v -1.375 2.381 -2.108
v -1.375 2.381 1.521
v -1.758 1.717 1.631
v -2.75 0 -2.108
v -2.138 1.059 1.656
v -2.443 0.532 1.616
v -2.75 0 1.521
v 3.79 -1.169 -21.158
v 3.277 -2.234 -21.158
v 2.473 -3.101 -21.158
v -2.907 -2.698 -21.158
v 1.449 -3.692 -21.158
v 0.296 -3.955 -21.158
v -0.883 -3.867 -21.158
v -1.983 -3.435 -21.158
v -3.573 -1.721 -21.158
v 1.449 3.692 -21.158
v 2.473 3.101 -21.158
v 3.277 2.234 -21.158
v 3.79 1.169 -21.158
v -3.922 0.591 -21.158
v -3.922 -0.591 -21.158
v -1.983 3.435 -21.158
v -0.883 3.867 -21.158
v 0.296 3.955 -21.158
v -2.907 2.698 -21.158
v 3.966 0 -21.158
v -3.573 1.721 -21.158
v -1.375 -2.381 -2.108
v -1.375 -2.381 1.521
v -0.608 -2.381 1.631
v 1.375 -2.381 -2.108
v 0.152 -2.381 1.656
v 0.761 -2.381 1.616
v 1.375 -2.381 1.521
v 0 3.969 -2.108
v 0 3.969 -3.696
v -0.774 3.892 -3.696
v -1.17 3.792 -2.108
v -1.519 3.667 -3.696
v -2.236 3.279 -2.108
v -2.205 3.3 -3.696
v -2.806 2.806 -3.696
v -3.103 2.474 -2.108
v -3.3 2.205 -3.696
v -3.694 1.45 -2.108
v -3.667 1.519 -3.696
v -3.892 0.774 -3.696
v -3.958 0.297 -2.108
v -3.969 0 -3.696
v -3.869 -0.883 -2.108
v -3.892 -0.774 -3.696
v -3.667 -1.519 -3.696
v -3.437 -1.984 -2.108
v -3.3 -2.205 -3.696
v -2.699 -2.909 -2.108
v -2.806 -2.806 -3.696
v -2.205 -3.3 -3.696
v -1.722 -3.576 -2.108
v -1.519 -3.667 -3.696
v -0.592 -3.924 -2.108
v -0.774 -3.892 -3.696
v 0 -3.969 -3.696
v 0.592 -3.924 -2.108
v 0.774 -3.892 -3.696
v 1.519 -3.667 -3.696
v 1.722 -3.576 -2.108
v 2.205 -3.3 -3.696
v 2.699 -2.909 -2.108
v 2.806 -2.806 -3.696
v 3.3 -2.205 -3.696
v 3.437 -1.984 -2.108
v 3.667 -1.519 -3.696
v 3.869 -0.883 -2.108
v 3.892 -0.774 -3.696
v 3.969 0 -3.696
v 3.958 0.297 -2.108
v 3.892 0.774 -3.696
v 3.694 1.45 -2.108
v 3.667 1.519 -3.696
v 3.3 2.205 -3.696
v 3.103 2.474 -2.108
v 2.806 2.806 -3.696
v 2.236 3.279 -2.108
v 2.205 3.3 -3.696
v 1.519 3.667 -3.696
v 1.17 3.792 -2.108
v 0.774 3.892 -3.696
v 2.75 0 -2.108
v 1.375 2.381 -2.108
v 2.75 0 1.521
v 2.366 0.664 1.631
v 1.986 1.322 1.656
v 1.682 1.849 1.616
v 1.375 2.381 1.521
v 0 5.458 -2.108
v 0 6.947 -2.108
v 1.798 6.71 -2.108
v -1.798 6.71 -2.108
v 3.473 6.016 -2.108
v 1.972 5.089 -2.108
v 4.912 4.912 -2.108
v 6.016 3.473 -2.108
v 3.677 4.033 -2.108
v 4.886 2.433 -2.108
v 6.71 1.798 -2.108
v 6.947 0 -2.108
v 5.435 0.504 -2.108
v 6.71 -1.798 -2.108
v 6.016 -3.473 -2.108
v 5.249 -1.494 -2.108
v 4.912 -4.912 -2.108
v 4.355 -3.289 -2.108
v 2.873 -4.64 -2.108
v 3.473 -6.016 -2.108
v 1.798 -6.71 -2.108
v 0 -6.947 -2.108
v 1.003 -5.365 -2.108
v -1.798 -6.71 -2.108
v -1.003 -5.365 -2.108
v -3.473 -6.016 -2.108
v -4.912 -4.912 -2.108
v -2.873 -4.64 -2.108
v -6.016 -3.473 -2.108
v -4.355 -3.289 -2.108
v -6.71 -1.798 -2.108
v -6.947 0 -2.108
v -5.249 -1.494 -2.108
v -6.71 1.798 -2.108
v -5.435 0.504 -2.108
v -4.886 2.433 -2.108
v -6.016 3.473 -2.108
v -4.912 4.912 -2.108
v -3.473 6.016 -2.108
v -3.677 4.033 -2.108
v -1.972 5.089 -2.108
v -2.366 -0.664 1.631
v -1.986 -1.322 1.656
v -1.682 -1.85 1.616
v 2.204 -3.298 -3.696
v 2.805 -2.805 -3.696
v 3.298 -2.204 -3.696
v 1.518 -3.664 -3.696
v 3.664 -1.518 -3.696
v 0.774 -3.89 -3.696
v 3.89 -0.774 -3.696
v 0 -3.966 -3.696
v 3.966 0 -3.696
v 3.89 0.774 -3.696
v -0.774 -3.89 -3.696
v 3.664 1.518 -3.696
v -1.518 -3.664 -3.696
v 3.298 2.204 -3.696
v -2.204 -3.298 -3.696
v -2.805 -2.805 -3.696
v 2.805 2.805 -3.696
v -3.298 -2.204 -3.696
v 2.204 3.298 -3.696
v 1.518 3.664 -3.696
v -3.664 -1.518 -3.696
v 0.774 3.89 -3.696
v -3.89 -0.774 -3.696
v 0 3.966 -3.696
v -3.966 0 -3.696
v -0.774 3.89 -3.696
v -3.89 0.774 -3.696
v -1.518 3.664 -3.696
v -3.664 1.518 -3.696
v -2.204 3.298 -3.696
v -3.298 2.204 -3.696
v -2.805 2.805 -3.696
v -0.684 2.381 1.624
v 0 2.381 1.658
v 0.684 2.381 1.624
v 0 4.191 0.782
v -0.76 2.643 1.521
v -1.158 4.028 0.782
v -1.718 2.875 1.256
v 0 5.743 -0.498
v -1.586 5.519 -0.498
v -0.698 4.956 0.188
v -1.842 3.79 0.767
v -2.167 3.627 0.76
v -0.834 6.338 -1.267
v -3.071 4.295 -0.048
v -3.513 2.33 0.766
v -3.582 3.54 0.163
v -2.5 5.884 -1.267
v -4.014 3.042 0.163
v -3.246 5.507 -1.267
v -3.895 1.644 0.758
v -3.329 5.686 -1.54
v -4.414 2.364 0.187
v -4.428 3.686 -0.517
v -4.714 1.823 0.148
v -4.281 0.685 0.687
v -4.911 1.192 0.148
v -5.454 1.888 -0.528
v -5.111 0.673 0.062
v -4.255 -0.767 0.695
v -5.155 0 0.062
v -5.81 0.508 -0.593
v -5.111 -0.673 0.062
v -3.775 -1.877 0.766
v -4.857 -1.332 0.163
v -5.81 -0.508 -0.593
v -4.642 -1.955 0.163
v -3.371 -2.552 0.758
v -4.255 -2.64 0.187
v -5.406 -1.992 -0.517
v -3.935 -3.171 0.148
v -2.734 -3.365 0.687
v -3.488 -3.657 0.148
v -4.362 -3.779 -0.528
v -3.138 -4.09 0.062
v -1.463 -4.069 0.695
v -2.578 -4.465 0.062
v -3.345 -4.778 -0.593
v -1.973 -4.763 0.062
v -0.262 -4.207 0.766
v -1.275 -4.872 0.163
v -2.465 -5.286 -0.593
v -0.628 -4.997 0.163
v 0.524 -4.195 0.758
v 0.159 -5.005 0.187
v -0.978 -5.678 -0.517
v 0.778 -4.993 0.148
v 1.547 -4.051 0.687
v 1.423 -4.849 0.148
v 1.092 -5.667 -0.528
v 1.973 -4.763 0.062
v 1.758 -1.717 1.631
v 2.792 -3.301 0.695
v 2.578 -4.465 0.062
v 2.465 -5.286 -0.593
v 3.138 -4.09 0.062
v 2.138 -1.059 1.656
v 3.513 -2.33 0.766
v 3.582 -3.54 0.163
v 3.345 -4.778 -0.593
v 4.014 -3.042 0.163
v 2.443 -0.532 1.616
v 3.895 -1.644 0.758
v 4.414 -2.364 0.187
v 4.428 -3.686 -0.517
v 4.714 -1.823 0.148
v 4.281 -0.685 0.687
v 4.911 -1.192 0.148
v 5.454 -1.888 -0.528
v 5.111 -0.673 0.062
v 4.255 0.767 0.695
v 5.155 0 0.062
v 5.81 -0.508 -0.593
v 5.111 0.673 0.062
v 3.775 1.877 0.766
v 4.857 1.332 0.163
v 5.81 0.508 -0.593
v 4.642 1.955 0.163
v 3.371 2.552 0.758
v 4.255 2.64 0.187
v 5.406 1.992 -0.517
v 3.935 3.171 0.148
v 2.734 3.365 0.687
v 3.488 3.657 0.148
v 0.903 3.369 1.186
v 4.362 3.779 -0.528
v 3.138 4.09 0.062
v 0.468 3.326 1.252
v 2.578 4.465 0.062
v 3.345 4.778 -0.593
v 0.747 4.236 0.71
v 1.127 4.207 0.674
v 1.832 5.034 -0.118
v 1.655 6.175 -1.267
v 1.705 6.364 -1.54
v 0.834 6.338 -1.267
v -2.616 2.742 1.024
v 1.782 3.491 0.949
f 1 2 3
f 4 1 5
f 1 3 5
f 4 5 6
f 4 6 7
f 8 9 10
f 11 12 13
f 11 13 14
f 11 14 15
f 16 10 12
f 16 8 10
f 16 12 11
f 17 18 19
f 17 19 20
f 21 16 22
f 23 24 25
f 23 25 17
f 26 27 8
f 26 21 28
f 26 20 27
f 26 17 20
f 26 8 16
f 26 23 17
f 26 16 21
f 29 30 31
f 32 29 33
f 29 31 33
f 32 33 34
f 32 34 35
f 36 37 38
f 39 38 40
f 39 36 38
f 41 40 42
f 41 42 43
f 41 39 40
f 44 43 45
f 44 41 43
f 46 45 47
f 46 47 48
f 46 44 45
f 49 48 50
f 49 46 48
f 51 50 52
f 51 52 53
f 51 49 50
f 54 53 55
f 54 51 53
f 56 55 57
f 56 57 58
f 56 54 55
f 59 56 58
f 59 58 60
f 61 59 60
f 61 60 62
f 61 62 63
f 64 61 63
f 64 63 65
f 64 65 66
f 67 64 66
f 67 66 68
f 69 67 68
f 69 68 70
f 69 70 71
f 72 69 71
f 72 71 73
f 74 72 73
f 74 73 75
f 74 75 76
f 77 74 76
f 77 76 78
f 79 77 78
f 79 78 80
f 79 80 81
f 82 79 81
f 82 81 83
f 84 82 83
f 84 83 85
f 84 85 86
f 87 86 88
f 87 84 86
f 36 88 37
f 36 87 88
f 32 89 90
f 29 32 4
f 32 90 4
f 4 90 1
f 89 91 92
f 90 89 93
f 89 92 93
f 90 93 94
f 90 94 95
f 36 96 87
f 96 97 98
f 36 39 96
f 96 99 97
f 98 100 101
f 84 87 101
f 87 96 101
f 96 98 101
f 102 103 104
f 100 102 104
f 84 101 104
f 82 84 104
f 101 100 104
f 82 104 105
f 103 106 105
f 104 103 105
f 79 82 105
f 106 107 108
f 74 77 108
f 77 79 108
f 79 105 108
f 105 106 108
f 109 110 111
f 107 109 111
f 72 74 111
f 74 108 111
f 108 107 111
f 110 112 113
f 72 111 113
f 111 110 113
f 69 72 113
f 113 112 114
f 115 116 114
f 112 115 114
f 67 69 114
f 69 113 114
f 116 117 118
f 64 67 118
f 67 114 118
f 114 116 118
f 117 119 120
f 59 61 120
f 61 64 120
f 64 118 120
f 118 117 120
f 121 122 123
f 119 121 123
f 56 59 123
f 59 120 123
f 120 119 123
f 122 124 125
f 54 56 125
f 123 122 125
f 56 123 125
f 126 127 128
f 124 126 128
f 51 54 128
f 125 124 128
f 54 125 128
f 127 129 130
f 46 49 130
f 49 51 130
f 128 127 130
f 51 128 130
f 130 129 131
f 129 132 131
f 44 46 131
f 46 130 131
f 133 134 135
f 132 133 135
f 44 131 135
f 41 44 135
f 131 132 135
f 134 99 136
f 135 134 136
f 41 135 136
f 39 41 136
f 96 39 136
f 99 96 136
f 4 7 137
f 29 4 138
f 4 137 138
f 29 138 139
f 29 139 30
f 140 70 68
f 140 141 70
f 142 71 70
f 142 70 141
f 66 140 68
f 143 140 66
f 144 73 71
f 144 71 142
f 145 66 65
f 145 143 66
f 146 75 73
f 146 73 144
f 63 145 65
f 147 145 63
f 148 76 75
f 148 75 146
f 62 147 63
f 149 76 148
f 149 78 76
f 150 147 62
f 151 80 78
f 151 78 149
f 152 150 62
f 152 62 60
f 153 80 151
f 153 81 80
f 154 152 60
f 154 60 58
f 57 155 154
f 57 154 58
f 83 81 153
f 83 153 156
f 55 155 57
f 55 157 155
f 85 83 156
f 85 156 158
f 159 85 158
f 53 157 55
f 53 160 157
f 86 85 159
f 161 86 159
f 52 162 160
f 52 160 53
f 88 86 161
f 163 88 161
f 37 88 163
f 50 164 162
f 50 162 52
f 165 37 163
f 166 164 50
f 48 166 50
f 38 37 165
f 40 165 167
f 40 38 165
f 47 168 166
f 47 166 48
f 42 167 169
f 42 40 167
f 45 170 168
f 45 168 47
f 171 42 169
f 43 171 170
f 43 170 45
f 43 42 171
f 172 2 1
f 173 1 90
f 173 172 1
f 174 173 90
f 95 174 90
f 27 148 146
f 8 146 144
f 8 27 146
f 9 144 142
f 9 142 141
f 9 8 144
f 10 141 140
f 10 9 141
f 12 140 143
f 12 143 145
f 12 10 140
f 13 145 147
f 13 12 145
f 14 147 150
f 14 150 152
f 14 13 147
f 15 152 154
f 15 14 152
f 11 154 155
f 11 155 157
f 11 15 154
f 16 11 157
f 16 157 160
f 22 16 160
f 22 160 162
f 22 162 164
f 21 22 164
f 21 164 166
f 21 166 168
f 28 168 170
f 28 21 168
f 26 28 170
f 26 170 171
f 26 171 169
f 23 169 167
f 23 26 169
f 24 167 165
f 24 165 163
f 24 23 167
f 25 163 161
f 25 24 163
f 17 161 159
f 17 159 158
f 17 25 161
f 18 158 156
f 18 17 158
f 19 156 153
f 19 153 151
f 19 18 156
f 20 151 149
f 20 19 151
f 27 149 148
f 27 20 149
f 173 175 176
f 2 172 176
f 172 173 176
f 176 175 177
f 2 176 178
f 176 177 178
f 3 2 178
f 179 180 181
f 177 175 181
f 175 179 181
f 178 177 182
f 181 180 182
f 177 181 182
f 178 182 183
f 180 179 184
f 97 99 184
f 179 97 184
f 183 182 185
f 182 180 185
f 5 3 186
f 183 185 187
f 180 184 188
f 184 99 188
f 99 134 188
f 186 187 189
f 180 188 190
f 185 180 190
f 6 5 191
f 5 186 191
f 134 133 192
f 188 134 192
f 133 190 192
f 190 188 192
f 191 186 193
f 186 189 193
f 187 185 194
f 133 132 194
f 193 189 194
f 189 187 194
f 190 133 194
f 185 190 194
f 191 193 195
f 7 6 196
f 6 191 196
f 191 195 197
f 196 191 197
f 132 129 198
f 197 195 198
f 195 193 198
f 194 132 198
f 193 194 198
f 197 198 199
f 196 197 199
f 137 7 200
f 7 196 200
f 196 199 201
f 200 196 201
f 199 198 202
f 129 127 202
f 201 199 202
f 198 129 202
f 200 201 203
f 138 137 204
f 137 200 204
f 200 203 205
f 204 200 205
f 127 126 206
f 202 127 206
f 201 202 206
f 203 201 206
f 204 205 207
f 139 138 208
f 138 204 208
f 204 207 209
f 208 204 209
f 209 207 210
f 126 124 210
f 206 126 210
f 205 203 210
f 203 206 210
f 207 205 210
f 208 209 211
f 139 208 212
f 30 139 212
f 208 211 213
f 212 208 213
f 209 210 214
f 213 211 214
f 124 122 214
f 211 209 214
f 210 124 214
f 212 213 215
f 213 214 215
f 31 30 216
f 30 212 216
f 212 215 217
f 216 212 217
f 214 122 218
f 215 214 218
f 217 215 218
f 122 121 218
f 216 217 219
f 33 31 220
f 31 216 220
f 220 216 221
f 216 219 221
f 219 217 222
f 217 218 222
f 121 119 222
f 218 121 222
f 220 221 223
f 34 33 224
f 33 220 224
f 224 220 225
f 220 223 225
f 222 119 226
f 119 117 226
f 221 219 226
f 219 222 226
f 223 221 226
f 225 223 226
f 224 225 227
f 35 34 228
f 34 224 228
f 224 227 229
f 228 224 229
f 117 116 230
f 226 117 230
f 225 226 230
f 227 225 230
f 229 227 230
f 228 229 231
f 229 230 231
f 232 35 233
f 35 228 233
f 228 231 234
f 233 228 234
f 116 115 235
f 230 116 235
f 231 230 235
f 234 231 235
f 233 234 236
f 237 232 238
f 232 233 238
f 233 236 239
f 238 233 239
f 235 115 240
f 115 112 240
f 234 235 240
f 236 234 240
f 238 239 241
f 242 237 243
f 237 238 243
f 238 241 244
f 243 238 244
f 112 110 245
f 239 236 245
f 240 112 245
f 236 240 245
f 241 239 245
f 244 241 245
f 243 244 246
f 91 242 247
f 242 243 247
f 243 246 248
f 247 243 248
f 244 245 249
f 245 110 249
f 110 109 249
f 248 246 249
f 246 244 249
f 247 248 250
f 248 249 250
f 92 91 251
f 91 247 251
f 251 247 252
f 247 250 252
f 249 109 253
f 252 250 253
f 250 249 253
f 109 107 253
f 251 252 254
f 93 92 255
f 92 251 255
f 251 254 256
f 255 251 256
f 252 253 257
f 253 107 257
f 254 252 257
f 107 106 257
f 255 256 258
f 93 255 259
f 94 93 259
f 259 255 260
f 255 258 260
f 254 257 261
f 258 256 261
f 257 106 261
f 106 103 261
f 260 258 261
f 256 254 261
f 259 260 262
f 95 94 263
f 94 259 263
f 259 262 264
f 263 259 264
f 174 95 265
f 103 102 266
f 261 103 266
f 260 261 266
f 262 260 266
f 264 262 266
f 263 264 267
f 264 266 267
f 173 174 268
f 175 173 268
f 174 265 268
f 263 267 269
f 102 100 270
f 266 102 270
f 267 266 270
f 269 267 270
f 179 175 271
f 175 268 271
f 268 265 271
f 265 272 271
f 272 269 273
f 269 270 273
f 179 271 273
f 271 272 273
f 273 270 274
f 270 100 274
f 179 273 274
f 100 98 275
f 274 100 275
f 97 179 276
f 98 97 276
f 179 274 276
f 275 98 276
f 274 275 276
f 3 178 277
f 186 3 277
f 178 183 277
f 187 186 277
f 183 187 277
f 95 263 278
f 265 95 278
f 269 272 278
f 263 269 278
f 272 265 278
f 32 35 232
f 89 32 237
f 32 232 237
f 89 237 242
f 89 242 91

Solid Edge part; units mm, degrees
sketch "Sketch1" plane through (0, 0, 0) normal (1, 0, 0) x (0, 1, 0)
  line L0 (0, -2.1082) -> (0, 2.1082)
  arc A0 (0, 2.1082) -> (6.9469, -2.1082) centre (-0.3606, -6.3169) cw
  line L1 (0, -2.1082) -> (6.9469, -2.1082)
  dimension "D1" = 4.2164
  dimension "D2" = 8.4328
revolve "RevolvedProtrusion1" add sketch "Sketch1" angle 360 about axis through (0, 0, -14.7796) along (0, 0, 1)
sketch "Sketch2" plane through (0, 0, -2.1082) normal (0, 0, -1) x (0, 1, 0)
  circle A0 centre (0, 0) radius 3.9687
  dimension "D1" = 7.9375
extrude "Protrusion1" add sketch "Sketch2" along normal blind 19.05
sketch "Sketch3" plane through (0, 0, -21.1582) normal (0, 0, -1) x (1, 0, 0)
  circle A0 centre (0, 0) radius 3.9662
  dimension "D1" = 0.0025
extrude "Cutout1" cut sketch "Sketch3" against normal blind 17.4625 flip side to cut
sketch "Sketch4" plane through (-0.6032, 0.3606, 4.2164) normal (0, 0, 1) x (1, 0, 0)
  line L0 (-0.7716, 2.0206) -> (1.978, 2.0206)
  line L1 (3.3529, -0.3606) -> (1.978, 2.0206)
  line L2 (1.978, -2.7419) -> (3.3529, -0.3606)
  line L3 (-0.7716, -2.7419) -> (1.978, -2.7419)
  line L4 (-2.1464, -0.3606) -> (-0.7716, -2.7419)
  line L5 (-0.7716, 2.0206) -> (-2.1464, -0.3606)
extrude "ExtrudedCutout_11" cut sketch "Sketch4" against normal blind 6.3246
properties part number "117718"
